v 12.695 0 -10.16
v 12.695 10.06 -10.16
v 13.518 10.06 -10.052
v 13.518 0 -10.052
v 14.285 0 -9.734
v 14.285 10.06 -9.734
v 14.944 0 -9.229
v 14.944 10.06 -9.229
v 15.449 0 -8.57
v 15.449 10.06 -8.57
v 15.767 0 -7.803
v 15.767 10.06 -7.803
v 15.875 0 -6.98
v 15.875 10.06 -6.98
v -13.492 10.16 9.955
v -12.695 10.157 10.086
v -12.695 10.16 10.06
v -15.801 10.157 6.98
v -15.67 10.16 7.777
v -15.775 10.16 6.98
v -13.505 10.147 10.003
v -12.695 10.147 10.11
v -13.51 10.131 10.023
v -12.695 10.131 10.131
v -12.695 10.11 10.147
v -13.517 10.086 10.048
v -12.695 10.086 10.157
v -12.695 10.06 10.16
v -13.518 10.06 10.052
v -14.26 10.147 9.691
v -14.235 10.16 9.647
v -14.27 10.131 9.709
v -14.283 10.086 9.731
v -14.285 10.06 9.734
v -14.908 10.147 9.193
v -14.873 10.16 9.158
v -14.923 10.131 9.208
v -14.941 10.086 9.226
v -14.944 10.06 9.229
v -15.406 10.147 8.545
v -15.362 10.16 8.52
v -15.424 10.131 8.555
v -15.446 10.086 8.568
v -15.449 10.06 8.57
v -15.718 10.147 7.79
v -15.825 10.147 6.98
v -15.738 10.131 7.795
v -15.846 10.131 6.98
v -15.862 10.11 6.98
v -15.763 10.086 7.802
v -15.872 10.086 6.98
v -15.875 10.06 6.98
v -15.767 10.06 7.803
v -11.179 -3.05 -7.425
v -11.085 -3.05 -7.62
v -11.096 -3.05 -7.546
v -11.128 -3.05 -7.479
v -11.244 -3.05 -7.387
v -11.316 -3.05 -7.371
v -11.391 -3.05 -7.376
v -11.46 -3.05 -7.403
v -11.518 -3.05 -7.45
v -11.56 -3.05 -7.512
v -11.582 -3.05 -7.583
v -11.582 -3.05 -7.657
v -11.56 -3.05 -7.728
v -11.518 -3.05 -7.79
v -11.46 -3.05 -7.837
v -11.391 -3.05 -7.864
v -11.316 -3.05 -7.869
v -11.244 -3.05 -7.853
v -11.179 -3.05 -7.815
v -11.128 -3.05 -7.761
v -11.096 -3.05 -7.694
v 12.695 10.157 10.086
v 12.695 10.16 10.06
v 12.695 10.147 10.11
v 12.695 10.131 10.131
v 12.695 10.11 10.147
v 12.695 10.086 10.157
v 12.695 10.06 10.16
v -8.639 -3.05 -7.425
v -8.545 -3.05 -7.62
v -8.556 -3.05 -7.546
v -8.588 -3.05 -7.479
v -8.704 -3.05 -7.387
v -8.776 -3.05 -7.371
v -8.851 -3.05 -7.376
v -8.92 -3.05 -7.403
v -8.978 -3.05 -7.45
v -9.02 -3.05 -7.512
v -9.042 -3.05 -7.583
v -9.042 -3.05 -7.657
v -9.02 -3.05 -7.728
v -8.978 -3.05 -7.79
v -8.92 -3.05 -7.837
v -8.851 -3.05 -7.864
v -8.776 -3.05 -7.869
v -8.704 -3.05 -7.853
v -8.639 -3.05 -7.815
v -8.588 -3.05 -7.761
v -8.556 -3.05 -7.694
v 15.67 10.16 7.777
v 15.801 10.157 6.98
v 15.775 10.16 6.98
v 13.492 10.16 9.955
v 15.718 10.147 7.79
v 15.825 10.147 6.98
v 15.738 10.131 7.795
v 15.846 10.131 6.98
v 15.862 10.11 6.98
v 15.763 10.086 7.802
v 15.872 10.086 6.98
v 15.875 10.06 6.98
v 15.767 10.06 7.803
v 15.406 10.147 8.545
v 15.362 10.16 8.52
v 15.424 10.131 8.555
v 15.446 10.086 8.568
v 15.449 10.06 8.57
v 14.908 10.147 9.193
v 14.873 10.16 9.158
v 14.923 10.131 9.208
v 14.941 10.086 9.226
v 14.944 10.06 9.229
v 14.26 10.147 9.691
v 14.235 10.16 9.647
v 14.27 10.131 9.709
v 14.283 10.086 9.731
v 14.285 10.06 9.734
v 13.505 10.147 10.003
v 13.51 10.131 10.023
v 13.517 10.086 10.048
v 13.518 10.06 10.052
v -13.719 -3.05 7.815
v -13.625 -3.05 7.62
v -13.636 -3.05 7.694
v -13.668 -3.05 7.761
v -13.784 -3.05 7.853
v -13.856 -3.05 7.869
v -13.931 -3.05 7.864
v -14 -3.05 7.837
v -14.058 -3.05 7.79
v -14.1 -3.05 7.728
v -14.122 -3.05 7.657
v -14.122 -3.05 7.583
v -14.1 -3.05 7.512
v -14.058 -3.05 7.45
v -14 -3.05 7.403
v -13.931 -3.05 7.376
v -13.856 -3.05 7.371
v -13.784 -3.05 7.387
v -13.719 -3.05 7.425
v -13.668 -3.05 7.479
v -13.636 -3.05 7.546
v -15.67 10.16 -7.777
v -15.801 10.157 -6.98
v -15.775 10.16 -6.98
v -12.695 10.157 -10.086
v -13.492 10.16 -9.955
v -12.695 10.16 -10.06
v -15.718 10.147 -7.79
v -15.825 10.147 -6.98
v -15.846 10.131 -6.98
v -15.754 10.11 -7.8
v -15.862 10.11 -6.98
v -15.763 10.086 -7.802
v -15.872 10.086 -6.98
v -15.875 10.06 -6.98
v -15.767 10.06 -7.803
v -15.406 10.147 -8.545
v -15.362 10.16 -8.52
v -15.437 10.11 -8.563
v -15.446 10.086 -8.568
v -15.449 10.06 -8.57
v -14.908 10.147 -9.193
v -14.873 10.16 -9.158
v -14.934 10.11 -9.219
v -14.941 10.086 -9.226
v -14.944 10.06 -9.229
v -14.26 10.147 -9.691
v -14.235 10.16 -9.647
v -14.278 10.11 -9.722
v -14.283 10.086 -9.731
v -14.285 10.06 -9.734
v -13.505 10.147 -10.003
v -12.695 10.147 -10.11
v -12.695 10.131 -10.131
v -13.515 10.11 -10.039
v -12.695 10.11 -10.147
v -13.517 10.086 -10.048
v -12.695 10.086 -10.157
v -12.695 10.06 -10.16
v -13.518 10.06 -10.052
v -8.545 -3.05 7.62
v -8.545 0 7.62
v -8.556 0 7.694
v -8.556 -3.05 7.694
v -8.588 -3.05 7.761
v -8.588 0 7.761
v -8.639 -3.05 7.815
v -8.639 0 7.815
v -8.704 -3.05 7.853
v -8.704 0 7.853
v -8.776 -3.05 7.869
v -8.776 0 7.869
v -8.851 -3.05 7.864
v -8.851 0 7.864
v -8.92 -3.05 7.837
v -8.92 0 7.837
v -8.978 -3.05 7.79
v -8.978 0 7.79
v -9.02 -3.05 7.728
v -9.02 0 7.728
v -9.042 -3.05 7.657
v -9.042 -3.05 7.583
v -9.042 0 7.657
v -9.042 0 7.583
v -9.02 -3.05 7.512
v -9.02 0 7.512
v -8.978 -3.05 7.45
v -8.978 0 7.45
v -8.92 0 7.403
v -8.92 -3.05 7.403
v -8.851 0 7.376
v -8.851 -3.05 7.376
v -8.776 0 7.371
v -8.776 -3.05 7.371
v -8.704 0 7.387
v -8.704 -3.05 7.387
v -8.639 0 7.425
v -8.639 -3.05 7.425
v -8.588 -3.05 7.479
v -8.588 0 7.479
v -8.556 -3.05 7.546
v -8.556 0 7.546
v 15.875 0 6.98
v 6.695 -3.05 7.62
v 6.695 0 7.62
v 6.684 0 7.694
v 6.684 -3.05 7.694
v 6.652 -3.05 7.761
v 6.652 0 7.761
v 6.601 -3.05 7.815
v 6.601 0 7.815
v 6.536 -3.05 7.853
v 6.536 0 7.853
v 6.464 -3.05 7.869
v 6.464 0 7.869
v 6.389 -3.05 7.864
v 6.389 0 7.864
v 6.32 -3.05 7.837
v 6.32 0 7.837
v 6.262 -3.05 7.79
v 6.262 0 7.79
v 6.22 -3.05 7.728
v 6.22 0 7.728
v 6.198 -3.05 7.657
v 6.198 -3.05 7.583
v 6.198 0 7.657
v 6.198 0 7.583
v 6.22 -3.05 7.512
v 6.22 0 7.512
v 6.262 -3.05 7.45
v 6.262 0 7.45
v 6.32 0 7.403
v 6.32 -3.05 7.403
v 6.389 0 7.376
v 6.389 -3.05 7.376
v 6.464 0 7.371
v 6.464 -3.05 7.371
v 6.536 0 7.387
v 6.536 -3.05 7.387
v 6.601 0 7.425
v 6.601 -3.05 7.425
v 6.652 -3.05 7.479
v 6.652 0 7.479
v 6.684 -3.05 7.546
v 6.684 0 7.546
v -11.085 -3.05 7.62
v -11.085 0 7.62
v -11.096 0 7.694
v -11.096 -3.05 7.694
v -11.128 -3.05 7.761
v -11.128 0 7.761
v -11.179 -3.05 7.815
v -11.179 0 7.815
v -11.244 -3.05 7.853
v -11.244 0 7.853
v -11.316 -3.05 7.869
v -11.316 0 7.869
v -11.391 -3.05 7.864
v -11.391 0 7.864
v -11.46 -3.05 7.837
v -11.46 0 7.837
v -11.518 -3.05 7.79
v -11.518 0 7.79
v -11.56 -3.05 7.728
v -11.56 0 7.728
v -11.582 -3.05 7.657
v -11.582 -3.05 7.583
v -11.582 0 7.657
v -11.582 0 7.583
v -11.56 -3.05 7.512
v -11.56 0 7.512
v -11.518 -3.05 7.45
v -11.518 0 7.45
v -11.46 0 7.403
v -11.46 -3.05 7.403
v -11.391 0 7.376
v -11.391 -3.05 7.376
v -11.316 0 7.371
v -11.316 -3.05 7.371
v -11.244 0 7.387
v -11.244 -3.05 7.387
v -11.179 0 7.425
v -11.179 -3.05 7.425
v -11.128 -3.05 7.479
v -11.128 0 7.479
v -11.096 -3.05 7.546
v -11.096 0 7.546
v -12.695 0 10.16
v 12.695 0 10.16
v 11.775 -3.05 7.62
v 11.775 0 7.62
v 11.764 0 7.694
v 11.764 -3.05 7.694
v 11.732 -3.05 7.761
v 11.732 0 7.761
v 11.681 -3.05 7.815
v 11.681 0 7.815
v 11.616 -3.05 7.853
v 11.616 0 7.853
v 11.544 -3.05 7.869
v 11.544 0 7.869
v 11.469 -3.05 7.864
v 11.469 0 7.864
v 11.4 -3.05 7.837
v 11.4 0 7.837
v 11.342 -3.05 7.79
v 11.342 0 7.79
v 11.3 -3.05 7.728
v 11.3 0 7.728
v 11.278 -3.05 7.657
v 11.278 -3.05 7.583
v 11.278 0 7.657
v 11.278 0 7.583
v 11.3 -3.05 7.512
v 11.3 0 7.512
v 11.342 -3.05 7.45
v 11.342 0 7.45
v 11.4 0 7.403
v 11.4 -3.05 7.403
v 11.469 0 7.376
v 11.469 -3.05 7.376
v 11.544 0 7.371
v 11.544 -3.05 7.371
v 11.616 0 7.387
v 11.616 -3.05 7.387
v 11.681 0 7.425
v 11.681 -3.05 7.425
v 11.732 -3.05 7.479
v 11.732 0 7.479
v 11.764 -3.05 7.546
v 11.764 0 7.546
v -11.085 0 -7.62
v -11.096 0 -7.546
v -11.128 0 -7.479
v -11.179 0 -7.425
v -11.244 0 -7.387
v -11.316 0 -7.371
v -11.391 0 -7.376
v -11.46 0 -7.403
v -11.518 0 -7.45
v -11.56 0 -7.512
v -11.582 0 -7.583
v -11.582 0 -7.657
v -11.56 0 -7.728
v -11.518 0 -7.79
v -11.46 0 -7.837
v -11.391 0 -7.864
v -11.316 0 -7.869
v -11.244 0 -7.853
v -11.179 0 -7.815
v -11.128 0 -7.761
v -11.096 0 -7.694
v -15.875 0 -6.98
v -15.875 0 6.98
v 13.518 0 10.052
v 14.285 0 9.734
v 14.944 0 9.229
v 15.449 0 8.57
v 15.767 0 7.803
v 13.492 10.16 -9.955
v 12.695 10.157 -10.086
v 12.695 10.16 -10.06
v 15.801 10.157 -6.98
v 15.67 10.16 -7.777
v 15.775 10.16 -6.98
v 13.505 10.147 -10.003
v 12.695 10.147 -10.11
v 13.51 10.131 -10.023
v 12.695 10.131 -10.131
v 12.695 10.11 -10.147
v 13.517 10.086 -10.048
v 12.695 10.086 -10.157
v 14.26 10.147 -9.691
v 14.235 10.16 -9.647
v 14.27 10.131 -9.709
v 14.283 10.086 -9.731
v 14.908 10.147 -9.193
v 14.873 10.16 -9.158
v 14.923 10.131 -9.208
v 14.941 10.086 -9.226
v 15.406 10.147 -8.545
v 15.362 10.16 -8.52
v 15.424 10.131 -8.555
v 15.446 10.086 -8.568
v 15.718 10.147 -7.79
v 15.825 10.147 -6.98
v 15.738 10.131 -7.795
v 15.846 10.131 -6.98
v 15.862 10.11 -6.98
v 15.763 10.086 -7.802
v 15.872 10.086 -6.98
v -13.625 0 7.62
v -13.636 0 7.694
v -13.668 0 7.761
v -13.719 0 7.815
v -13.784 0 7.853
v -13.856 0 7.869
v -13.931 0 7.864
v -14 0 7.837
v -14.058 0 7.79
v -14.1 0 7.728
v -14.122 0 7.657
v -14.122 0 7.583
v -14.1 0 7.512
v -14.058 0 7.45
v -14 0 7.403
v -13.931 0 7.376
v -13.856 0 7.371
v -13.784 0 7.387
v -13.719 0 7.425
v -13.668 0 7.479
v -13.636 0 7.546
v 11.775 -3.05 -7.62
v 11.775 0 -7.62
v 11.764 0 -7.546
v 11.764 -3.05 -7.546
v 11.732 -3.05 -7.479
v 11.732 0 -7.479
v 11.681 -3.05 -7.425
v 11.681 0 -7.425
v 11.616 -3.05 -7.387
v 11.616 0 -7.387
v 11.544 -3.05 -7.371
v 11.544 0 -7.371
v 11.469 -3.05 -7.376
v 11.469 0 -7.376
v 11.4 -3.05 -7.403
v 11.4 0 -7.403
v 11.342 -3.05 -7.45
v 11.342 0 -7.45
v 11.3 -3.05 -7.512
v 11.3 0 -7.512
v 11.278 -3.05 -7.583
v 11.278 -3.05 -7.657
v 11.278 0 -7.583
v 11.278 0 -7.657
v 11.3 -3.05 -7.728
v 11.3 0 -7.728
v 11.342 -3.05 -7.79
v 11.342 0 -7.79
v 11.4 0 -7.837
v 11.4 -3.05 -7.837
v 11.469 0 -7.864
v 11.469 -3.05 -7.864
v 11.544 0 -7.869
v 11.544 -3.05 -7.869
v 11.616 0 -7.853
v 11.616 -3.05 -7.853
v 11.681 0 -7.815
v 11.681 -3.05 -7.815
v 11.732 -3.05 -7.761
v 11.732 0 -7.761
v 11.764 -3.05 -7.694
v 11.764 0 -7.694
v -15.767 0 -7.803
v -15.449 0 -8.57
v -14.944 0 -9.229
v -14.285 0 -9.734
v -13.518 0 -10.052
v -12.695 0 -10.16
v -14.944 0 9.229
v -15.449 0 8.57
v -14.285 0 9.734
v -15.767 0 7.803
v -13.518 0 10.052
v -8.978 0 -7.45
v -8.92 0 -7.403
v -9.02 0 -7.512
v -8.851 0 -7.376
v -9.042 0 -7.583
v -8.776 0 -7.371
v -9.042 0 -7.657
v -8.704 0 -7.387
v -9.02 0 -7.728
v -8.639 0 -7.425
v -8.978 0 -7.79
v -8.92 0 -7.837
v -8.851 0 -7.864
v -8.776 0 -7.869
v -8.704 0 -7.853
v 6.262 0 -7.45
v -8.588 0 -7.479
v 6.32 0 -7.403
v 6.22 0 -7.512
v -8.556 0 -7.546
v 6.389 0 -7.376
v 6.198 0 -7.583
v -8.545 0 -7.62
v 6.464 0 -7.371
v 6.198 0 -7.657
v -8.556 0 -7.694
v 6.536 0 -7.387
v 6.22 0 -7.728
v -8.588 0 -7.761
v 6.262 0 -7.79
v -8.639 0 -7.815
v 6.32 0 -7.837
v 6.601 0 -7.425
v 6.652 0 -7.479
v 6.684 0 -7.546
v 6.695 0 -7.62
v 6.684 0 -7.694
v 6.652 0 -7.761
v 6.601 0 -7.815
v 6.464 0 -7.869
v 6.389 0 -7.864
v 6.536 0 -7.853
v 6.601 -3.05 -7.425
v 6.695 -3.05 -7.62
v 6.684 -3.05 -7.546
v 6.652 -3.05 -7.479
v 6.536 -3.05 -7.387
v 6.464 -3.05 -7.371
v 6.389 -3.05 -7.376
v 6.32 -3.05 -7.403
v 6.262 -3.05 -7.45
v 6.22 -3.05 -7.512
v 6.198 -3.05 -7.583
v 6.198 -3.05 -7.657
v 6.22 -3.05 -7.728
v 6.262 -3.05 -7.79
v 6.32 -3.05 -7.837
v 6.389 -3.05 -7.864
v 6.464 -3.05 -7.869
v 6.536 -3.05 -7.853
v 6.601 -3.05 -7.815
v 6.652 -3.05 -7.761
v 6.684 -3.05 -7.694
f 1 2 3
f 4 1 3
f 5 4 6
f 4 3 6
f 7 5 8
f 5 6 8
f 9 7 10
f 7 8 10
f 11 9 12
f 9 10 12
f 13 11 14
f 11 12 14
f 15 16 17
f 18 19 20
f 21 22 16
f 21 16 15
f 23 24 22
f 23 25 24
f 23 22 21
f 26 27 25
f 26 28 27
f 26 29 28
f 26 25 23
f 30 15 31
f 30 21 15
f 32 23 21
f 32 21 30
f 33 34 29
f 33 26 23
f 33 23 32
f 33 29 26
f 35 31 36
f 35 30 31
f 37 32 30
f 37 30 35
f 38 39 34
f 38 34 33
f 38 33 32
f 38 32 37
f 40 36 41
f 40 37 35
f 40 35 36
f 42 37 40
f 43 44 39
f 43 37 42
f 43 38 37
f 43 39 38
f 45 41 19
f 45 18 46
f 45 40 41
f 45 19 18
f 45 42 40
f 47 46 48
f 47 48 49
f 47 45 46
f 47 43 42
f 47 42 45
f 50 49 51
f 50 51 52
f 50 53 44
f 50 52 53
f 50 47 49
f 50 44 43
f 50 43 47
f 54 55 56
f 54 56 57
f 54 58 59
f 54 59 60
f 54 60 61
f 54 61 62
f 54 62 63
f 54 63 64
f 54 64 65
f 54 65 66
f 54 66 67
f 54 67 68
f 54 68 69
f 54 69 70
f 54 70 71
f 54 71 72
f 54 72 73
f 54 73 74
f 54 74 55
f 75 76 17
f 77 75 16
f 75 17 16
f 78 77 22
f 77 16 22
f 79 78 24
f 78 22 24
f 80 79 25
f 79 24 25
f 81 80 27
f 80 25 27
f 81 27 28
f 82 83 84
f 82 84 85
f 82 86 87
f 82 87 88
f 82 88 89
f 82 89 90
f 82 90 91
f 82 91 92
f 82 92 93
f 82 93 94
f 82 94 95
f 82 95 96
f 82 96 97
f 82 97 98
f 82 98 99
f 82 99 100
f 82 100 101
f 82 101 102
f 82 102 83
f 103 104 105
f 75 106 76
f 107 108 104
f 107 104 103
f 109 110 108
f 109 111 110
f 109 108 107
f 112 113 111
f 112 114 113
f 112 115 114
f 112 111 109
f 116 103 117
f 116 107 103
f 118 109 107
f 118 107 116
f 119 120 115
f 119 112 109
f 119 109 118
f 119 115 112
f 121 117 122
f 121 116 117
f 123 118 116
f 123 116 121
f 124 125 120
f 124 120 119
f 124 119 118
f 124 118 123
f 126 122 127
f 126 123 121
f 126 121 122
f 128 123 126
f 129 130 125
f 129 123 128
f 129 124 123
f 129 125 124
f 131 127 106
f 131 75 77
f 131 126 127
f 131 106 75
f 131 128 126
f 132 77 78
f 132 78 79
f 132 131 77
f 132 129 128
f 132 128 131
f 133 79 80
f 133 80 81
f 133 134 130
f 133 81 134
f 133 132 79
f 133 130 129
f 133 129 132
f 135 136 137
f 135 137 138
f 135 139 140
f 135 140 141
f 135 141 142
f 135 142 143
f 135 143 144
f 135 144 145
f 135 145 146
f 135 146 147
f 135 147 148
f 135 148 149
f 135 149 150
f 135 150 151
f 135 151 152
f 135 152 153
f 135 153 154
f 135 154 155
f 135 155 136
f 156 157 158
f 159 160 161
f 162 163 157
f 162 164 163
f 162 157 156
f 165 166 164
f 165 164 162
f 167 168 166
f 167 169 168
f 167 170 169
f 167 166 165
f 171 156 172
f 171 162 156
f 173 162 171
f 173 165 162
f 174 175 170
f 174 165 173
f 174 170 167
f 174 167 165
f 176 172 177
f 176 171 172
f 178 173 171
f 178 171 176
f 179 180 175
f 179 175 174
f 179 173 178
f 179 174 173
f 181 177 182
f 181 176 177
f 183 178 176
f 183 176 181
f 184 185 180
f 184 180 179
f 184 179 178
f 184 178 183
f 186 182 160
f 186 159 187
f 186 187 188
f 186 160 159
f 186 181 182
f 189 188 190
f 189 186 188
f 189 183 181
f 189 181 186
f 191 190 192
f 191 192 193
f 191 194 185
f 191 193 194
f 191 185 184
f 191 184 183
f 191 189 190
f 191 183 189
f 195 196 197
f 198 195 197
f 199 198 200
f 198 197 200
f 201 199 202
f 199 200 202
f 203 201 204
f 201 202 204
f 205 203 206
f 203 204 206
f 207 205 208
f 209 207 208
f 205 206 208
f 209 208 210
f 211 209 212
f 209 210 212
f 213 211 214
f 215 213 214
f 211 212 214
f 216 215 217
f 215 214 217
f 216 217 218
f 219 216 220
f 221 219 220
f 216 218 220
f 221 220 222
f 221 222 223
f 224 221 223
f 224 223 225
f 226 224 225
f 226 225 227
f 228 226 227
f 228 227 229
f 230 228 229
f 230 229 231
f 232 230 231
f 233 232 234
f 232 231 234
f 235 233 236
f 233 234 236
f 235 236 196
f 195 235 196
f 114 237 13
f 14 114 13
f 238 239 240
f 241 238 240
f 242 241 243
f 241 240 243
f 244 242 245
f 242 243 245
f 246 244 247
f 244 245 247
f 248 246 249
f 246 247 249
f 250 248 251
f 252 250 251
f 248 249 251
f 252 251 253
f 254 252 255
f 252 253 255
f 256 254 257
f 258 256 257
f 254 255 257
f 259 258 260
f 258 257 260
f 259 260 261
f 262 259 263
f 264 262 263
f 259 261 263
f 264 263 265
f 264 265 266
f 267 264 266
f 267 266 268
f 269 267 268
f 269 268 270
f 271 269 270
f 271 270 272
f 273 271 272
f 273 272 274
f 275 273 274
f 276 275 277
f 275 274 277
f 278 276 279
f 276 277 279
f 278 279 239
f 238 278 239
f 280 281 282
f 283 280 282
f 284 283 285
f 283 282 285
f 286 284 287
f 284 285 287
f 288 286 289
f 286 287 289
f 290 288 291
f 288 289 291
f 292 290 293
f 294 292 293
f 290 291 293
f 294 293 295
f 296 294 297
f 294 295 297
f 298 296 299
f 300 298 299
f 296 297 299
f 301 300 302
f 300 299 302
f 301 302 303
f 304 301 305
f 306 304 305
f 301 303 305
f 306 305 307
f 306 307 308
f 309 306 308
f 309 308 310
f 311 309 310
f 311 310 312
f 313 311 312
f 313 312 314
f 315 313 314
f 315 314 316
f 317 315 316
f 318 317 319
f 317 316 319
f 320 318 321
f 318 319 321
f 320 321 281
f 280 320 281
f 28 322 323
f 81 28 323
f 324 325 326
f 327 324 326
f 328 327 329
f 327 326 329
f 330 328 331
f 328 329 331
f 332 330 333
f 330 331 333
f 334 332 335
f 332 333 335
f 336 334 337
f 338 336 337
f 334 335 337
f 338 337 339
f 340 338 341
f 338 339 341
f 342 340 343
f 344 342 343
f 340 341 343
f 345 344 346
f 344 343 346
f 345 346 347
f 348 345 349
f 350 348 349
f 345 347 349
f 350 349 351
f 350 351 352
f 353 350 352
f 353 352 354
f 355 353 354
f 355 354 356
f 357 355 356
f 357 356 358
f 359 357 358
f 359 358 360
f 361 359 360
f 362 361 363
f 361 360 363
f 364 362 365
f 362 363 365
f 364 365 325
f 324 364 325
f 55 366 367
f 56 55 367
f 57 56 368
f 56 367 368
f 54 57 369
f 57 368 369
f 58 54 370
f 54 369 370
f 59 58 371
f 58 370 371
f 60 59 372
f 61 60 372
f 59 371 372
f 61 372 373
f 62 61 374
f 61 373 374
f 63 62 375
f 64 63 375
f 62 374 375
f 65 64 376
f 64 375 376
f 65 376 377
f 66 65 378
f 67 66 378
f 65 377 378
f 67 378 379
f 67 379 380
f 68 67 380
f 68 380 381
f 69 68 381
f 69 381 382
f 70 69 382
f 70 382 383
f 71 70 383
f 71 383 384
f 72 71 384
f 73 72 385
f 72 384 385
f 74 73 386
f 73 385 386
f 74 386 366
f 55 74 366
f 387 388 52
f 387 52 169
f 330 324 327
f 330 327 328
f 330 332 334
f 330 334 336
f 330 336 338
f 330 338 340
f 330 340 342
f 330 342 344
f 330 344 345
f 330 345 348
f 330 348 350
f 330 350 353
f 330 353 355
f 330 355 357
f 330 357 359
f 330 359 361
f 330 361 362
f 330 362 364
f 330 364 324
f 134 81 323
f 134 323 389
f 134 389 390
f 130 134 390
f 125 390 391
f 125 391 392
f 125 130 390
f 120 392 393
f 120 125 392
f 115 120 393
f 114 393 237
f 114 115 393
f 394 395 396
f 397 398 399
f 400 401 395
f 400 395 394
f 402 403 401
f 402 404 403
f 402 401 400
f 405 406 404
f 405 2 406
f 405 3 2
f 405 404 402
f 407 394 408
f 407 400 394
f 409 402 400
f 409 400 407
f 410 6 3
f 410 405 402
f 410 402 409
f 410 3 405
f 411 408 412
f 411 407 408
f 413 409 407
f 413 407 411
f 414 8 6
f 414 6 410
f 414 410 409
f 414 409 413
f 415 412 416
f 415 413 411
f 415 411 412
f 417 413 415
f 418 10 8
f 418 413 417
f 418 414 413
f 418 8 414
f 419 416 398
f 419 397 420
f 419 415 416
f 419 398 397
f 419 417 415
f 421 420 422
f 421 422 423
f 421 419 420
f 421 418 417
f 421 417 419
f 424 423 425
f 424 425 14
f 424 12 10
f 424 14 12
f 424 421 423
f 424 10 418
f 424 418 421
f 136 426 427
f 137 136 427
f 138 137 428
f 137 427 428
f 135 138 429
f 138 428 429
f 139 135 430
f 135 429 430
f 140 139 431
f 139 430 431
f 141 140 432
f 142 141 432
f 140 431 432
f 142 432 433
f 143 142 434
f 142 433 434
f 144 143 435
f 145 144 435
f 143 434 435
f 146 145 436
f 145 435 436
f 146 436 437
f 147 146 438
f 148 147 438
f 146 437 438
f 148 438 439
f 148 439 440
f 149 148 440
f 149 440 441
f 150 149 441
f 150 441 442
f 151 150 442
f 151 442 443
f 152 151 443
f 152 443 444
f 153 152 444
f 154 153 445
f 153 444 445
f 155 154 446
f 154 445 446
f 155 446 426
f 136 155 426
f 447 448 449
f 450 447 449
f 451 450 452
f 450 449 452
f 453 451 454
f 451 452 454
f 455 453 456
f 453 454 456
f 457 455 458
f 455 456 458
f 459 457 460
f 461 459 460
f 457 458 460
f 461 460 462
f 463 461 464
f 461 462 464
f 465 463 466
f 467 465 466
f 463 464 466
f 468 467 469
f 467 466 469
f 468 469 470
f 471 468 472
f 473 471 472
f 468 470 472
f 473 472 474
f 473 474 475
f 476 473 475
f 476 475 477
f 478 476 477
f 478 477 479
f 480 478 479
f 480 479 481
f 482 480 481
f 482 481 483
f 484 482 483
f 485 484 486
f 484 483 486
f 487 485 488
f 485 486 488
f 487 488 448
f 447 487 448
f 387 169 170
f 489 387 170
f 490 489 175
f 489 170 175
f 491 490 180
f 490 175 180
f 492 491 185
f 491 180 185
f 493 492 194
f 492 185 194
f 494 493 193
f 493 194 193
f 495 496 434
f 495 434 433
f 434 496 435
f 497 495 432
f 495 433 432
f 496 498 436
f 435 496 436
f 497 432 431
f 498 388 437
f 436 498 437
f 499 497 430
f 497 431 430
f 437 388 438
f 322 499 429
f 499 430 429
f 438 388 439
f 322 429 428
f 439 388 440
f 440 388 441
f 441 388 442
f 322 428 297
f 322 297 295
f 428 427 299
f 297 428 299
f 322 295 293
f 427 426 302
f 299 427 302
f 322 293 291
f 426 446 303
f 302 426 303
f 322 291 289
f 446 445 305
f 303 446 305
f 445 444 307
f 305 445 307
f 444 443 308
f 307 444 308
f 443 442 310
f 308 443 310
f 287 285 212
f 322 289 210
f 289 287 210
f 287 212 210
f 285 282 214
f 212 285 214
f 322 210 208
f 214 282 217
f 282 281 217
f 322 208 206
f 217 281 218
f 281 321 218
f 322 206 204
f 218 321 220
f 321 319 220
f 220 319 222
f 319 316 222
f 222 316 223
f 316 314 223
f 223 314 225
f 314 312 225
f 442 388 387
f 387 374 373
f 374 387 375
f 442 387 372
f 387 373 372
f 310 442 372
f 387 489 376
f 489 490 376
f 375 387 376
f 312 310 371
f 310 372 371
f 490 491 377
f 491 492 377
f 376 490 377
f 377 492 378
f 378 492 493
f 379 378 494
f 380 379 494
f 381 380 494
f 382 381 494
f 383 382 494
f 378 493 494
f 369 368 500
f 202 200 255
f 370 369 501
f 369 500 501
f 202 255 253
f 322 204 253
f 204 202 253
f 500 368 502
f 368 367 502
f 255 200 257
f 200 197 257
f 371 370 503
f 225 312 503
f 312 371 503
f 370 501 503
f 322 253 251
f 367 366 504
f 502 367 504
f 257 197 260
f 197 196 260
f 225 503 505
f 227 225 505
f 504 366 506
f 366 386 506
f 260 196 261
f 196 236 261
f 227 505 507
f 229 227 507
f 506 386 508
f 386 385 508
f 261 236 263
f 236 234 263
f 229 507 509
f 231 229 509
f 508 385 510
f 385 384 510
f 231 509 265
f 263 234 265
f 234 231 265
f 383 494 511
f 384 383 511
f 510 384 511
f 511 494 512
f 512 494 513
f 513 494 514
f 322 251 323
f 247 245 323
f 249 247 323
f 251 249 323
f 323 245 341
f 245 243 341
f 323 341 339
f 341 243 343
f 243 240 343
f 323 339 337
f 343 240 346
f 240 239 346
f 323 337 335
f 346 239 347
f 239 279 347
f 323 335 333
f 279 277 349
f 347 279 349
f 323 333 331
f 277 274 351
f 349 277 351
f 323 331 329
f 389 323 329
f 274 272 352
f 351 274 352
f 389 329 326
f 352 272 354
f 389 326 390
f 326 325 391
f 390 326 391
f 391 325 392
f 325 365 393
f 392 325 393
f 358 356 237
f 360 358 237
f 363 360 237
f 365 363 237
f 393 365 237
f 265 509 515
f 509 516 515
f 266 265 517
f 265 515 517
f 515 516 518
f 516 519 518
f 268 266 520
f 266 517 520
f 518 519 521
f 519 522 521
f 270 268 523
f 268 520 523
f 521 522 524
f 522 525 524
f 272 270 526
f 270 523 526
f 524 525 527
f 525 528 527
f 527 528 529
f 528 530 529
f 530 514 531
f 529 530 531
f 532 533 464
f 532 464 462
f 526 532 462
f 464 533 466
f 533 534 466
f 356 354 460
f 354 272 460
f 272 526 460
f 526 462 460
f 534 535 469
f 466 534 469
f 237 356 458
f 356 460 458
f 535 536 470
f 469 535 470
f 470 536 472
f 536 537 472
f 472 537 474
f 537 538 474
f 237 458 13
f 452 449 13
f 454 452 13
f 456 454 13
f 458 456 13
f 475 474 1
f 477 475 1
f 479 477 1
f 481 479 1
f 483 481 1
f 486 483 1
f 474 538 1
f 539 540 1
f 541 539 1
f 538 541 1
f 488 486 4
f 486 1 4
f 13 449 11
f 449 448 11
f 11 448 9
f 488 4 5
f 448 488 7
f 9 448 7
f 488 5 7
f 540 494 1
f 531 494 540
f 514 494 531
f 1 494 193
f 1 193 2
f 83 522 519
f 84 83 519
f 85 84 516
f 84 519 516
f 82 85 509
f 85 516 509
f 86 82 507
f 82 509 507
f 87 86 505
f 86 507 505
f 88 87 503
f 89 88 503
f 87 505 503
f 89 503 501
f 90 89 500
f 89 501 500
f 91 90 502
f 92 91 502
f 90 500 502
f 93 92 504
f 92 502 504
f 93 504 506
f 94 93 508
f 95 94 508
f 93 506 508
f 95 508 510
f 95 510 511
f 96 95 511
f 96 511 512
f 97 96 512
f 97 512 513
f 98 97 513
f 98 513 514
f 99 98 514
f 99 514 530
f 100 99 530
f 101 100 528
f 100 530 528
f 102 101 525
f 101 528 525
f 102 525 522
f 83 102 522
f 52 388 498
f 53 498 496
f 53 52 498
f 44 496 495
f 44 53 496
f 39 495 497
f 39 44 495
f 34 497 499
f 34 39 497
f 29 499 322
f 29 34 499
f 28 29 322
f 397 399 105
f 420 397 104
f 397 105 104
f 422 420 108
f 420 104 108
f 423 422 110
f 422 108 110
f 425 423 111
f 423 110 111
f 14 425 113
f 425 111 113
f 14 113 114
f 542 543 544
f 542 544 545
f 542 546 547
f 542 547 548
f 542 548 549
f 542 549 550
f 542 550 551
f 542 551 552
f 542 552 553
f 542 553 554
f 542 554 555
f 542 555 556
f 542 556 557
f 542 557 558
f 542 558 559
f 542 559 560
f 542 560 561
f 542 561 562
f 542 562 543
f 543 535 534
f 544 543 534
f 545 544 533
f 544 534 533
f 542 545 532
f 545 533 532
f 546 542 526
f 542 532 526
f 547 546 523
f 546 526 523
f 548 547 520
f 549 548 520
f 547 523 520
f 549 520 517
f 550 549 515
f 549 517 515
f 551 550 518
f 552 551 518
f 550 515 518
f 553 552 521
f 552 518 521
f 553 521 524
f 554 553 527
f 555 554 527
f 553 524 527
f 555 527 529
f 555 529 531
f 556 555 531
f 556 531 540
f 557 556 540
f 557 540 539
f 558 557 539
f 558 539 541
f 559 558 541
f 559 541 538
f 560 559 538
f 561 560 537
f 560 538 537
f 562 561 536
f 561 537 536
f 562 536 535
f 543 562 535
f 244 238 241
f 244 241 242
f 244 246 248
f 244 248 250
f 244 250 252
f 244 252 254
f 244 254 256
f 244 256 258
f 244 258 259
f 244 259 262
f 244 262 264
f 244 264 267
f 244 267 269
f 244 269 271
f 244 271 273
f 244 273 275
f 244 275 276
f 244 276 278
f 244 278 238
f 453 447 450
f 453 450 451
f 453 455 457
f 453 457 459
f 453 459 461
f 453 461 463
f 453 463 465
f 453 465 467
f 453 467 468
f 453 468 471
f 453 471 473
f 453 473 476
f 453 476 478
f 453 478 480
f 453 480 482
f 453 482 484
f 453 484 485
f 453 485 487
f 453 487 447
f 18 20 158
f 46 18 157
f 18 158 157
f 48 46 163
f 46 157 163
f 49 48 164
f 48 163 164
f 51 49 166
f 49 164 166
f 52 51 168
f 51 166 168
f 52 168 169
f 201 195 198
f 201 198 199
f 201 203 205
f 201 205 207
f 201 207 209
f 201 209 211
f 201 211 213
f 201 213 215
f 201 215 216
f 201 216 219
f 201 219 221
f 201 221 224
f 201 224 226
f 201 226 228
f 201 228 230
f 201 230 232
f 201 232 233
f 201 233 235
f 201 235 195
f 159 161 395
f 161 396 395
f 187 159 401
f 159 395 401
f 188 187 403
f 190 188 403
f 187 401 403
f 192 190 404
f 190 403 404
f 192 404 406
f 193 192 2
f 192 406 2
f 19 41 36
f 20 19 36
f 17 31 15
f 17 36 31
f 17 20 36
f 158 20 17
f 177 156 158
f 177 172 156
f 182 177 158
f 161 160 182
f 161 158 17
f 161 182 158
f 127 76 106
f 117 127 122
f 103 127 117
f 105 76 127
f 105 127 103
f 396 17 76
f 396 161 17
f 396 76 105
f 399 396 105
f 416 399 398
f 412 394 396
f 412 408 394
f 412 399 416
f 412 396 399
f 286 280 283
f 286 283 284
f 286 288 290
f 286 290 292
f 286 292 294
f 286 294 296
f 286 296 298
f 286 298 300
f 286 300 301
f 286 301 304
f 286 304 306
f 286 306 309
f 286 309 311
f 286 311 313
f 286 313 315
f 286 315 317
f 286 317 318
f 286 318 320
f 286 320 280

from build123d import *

# Parameters (mm, degrees)
SKETCH1_W           = 31.75
SKETCH1_H           = 20.32
BOSS_EXTRUDE1_DEPTH = 10.16
SKETCH2_R           = 0.25
BOSS_EXTRUDE2_DEPTH = 3.05
FILLET1_R           = 3.18
FILLET2_R           = 0.1


with BuildPart() as part:
    # Sketch1 → Boss-Extrude1 (new body)
    with BuildSketch(Plane(origin=(0, 0, 0), x_dir=(1, 0, 0), z_dir=(0, 1, 0))):
        Rectangle(SKETCH1_W, SKETCH1_H)
    extrude(amount=BOSS_EXTRUDE1_DEPTH)

    # Sketch2 → Boss-Extrude2 (add)
    with BuildSketch(Plane.XZ):
        with Locations((-13.875, 7.62)):
            Circle(SKETCH2_R)
        with Locations((-11.335, 7.62)):
            Circle(SKETCH2_R)
        with Locations((-8.795, 7.62)):
            Circle(SKETCH2_R)
        with Locations((6.445, 7.62)):
            Circle(SKETCH2_R)
        with Locations((11.525, 7.62)):
            Circle(SKETCH2_R)
        with Locations((11.525, -7.62)):
            Circle(SKETCH2_R)
        with Locations((6.445, -7.62)):
            Circle(SKETCH2_R)
        with Locations((-8.795, -7.62)):
            Circle(SKETCH2_R)
        with Locations((-11.335, -7.62)):
            Circle(SKETCH2_R)
    extrude(amount=BOSS_EXTRUDE2_DEPTH)

    # Fillet1
    fillet1_edges = [part.edges().sort_by_distance(p)[0] for p in [
        (-15.875, 5.08, -10.16),
        (15.875, 5.08, -10.16),
        (15.875, 5.08, 10.16),
        (-15.875, 5.08, 10.16),
    ]]
    fillet(fillet1_edges, radius=FILLET1_R)

    # Fillet2
    fillet2_edges = [part.edges().sort_by_distance(p)[0] for p in [
        (0, 10.16, -10.16),
        (15.875, 10.16, 0),
        (-15.875, 10.16, 0),
        (0, 10.16, 10.16),
        (-14.943599564, 10.16, 9.228599564),
        (-14.943599564, 10.16, -9.228599564),
        (14.943599564, 10.16, 9.228599564),
        (14.943599564, 10.16, -9.228599564),
    ]]
    fillet(fillet2_edges, radius=FILLET2_R)


solid = part.part
